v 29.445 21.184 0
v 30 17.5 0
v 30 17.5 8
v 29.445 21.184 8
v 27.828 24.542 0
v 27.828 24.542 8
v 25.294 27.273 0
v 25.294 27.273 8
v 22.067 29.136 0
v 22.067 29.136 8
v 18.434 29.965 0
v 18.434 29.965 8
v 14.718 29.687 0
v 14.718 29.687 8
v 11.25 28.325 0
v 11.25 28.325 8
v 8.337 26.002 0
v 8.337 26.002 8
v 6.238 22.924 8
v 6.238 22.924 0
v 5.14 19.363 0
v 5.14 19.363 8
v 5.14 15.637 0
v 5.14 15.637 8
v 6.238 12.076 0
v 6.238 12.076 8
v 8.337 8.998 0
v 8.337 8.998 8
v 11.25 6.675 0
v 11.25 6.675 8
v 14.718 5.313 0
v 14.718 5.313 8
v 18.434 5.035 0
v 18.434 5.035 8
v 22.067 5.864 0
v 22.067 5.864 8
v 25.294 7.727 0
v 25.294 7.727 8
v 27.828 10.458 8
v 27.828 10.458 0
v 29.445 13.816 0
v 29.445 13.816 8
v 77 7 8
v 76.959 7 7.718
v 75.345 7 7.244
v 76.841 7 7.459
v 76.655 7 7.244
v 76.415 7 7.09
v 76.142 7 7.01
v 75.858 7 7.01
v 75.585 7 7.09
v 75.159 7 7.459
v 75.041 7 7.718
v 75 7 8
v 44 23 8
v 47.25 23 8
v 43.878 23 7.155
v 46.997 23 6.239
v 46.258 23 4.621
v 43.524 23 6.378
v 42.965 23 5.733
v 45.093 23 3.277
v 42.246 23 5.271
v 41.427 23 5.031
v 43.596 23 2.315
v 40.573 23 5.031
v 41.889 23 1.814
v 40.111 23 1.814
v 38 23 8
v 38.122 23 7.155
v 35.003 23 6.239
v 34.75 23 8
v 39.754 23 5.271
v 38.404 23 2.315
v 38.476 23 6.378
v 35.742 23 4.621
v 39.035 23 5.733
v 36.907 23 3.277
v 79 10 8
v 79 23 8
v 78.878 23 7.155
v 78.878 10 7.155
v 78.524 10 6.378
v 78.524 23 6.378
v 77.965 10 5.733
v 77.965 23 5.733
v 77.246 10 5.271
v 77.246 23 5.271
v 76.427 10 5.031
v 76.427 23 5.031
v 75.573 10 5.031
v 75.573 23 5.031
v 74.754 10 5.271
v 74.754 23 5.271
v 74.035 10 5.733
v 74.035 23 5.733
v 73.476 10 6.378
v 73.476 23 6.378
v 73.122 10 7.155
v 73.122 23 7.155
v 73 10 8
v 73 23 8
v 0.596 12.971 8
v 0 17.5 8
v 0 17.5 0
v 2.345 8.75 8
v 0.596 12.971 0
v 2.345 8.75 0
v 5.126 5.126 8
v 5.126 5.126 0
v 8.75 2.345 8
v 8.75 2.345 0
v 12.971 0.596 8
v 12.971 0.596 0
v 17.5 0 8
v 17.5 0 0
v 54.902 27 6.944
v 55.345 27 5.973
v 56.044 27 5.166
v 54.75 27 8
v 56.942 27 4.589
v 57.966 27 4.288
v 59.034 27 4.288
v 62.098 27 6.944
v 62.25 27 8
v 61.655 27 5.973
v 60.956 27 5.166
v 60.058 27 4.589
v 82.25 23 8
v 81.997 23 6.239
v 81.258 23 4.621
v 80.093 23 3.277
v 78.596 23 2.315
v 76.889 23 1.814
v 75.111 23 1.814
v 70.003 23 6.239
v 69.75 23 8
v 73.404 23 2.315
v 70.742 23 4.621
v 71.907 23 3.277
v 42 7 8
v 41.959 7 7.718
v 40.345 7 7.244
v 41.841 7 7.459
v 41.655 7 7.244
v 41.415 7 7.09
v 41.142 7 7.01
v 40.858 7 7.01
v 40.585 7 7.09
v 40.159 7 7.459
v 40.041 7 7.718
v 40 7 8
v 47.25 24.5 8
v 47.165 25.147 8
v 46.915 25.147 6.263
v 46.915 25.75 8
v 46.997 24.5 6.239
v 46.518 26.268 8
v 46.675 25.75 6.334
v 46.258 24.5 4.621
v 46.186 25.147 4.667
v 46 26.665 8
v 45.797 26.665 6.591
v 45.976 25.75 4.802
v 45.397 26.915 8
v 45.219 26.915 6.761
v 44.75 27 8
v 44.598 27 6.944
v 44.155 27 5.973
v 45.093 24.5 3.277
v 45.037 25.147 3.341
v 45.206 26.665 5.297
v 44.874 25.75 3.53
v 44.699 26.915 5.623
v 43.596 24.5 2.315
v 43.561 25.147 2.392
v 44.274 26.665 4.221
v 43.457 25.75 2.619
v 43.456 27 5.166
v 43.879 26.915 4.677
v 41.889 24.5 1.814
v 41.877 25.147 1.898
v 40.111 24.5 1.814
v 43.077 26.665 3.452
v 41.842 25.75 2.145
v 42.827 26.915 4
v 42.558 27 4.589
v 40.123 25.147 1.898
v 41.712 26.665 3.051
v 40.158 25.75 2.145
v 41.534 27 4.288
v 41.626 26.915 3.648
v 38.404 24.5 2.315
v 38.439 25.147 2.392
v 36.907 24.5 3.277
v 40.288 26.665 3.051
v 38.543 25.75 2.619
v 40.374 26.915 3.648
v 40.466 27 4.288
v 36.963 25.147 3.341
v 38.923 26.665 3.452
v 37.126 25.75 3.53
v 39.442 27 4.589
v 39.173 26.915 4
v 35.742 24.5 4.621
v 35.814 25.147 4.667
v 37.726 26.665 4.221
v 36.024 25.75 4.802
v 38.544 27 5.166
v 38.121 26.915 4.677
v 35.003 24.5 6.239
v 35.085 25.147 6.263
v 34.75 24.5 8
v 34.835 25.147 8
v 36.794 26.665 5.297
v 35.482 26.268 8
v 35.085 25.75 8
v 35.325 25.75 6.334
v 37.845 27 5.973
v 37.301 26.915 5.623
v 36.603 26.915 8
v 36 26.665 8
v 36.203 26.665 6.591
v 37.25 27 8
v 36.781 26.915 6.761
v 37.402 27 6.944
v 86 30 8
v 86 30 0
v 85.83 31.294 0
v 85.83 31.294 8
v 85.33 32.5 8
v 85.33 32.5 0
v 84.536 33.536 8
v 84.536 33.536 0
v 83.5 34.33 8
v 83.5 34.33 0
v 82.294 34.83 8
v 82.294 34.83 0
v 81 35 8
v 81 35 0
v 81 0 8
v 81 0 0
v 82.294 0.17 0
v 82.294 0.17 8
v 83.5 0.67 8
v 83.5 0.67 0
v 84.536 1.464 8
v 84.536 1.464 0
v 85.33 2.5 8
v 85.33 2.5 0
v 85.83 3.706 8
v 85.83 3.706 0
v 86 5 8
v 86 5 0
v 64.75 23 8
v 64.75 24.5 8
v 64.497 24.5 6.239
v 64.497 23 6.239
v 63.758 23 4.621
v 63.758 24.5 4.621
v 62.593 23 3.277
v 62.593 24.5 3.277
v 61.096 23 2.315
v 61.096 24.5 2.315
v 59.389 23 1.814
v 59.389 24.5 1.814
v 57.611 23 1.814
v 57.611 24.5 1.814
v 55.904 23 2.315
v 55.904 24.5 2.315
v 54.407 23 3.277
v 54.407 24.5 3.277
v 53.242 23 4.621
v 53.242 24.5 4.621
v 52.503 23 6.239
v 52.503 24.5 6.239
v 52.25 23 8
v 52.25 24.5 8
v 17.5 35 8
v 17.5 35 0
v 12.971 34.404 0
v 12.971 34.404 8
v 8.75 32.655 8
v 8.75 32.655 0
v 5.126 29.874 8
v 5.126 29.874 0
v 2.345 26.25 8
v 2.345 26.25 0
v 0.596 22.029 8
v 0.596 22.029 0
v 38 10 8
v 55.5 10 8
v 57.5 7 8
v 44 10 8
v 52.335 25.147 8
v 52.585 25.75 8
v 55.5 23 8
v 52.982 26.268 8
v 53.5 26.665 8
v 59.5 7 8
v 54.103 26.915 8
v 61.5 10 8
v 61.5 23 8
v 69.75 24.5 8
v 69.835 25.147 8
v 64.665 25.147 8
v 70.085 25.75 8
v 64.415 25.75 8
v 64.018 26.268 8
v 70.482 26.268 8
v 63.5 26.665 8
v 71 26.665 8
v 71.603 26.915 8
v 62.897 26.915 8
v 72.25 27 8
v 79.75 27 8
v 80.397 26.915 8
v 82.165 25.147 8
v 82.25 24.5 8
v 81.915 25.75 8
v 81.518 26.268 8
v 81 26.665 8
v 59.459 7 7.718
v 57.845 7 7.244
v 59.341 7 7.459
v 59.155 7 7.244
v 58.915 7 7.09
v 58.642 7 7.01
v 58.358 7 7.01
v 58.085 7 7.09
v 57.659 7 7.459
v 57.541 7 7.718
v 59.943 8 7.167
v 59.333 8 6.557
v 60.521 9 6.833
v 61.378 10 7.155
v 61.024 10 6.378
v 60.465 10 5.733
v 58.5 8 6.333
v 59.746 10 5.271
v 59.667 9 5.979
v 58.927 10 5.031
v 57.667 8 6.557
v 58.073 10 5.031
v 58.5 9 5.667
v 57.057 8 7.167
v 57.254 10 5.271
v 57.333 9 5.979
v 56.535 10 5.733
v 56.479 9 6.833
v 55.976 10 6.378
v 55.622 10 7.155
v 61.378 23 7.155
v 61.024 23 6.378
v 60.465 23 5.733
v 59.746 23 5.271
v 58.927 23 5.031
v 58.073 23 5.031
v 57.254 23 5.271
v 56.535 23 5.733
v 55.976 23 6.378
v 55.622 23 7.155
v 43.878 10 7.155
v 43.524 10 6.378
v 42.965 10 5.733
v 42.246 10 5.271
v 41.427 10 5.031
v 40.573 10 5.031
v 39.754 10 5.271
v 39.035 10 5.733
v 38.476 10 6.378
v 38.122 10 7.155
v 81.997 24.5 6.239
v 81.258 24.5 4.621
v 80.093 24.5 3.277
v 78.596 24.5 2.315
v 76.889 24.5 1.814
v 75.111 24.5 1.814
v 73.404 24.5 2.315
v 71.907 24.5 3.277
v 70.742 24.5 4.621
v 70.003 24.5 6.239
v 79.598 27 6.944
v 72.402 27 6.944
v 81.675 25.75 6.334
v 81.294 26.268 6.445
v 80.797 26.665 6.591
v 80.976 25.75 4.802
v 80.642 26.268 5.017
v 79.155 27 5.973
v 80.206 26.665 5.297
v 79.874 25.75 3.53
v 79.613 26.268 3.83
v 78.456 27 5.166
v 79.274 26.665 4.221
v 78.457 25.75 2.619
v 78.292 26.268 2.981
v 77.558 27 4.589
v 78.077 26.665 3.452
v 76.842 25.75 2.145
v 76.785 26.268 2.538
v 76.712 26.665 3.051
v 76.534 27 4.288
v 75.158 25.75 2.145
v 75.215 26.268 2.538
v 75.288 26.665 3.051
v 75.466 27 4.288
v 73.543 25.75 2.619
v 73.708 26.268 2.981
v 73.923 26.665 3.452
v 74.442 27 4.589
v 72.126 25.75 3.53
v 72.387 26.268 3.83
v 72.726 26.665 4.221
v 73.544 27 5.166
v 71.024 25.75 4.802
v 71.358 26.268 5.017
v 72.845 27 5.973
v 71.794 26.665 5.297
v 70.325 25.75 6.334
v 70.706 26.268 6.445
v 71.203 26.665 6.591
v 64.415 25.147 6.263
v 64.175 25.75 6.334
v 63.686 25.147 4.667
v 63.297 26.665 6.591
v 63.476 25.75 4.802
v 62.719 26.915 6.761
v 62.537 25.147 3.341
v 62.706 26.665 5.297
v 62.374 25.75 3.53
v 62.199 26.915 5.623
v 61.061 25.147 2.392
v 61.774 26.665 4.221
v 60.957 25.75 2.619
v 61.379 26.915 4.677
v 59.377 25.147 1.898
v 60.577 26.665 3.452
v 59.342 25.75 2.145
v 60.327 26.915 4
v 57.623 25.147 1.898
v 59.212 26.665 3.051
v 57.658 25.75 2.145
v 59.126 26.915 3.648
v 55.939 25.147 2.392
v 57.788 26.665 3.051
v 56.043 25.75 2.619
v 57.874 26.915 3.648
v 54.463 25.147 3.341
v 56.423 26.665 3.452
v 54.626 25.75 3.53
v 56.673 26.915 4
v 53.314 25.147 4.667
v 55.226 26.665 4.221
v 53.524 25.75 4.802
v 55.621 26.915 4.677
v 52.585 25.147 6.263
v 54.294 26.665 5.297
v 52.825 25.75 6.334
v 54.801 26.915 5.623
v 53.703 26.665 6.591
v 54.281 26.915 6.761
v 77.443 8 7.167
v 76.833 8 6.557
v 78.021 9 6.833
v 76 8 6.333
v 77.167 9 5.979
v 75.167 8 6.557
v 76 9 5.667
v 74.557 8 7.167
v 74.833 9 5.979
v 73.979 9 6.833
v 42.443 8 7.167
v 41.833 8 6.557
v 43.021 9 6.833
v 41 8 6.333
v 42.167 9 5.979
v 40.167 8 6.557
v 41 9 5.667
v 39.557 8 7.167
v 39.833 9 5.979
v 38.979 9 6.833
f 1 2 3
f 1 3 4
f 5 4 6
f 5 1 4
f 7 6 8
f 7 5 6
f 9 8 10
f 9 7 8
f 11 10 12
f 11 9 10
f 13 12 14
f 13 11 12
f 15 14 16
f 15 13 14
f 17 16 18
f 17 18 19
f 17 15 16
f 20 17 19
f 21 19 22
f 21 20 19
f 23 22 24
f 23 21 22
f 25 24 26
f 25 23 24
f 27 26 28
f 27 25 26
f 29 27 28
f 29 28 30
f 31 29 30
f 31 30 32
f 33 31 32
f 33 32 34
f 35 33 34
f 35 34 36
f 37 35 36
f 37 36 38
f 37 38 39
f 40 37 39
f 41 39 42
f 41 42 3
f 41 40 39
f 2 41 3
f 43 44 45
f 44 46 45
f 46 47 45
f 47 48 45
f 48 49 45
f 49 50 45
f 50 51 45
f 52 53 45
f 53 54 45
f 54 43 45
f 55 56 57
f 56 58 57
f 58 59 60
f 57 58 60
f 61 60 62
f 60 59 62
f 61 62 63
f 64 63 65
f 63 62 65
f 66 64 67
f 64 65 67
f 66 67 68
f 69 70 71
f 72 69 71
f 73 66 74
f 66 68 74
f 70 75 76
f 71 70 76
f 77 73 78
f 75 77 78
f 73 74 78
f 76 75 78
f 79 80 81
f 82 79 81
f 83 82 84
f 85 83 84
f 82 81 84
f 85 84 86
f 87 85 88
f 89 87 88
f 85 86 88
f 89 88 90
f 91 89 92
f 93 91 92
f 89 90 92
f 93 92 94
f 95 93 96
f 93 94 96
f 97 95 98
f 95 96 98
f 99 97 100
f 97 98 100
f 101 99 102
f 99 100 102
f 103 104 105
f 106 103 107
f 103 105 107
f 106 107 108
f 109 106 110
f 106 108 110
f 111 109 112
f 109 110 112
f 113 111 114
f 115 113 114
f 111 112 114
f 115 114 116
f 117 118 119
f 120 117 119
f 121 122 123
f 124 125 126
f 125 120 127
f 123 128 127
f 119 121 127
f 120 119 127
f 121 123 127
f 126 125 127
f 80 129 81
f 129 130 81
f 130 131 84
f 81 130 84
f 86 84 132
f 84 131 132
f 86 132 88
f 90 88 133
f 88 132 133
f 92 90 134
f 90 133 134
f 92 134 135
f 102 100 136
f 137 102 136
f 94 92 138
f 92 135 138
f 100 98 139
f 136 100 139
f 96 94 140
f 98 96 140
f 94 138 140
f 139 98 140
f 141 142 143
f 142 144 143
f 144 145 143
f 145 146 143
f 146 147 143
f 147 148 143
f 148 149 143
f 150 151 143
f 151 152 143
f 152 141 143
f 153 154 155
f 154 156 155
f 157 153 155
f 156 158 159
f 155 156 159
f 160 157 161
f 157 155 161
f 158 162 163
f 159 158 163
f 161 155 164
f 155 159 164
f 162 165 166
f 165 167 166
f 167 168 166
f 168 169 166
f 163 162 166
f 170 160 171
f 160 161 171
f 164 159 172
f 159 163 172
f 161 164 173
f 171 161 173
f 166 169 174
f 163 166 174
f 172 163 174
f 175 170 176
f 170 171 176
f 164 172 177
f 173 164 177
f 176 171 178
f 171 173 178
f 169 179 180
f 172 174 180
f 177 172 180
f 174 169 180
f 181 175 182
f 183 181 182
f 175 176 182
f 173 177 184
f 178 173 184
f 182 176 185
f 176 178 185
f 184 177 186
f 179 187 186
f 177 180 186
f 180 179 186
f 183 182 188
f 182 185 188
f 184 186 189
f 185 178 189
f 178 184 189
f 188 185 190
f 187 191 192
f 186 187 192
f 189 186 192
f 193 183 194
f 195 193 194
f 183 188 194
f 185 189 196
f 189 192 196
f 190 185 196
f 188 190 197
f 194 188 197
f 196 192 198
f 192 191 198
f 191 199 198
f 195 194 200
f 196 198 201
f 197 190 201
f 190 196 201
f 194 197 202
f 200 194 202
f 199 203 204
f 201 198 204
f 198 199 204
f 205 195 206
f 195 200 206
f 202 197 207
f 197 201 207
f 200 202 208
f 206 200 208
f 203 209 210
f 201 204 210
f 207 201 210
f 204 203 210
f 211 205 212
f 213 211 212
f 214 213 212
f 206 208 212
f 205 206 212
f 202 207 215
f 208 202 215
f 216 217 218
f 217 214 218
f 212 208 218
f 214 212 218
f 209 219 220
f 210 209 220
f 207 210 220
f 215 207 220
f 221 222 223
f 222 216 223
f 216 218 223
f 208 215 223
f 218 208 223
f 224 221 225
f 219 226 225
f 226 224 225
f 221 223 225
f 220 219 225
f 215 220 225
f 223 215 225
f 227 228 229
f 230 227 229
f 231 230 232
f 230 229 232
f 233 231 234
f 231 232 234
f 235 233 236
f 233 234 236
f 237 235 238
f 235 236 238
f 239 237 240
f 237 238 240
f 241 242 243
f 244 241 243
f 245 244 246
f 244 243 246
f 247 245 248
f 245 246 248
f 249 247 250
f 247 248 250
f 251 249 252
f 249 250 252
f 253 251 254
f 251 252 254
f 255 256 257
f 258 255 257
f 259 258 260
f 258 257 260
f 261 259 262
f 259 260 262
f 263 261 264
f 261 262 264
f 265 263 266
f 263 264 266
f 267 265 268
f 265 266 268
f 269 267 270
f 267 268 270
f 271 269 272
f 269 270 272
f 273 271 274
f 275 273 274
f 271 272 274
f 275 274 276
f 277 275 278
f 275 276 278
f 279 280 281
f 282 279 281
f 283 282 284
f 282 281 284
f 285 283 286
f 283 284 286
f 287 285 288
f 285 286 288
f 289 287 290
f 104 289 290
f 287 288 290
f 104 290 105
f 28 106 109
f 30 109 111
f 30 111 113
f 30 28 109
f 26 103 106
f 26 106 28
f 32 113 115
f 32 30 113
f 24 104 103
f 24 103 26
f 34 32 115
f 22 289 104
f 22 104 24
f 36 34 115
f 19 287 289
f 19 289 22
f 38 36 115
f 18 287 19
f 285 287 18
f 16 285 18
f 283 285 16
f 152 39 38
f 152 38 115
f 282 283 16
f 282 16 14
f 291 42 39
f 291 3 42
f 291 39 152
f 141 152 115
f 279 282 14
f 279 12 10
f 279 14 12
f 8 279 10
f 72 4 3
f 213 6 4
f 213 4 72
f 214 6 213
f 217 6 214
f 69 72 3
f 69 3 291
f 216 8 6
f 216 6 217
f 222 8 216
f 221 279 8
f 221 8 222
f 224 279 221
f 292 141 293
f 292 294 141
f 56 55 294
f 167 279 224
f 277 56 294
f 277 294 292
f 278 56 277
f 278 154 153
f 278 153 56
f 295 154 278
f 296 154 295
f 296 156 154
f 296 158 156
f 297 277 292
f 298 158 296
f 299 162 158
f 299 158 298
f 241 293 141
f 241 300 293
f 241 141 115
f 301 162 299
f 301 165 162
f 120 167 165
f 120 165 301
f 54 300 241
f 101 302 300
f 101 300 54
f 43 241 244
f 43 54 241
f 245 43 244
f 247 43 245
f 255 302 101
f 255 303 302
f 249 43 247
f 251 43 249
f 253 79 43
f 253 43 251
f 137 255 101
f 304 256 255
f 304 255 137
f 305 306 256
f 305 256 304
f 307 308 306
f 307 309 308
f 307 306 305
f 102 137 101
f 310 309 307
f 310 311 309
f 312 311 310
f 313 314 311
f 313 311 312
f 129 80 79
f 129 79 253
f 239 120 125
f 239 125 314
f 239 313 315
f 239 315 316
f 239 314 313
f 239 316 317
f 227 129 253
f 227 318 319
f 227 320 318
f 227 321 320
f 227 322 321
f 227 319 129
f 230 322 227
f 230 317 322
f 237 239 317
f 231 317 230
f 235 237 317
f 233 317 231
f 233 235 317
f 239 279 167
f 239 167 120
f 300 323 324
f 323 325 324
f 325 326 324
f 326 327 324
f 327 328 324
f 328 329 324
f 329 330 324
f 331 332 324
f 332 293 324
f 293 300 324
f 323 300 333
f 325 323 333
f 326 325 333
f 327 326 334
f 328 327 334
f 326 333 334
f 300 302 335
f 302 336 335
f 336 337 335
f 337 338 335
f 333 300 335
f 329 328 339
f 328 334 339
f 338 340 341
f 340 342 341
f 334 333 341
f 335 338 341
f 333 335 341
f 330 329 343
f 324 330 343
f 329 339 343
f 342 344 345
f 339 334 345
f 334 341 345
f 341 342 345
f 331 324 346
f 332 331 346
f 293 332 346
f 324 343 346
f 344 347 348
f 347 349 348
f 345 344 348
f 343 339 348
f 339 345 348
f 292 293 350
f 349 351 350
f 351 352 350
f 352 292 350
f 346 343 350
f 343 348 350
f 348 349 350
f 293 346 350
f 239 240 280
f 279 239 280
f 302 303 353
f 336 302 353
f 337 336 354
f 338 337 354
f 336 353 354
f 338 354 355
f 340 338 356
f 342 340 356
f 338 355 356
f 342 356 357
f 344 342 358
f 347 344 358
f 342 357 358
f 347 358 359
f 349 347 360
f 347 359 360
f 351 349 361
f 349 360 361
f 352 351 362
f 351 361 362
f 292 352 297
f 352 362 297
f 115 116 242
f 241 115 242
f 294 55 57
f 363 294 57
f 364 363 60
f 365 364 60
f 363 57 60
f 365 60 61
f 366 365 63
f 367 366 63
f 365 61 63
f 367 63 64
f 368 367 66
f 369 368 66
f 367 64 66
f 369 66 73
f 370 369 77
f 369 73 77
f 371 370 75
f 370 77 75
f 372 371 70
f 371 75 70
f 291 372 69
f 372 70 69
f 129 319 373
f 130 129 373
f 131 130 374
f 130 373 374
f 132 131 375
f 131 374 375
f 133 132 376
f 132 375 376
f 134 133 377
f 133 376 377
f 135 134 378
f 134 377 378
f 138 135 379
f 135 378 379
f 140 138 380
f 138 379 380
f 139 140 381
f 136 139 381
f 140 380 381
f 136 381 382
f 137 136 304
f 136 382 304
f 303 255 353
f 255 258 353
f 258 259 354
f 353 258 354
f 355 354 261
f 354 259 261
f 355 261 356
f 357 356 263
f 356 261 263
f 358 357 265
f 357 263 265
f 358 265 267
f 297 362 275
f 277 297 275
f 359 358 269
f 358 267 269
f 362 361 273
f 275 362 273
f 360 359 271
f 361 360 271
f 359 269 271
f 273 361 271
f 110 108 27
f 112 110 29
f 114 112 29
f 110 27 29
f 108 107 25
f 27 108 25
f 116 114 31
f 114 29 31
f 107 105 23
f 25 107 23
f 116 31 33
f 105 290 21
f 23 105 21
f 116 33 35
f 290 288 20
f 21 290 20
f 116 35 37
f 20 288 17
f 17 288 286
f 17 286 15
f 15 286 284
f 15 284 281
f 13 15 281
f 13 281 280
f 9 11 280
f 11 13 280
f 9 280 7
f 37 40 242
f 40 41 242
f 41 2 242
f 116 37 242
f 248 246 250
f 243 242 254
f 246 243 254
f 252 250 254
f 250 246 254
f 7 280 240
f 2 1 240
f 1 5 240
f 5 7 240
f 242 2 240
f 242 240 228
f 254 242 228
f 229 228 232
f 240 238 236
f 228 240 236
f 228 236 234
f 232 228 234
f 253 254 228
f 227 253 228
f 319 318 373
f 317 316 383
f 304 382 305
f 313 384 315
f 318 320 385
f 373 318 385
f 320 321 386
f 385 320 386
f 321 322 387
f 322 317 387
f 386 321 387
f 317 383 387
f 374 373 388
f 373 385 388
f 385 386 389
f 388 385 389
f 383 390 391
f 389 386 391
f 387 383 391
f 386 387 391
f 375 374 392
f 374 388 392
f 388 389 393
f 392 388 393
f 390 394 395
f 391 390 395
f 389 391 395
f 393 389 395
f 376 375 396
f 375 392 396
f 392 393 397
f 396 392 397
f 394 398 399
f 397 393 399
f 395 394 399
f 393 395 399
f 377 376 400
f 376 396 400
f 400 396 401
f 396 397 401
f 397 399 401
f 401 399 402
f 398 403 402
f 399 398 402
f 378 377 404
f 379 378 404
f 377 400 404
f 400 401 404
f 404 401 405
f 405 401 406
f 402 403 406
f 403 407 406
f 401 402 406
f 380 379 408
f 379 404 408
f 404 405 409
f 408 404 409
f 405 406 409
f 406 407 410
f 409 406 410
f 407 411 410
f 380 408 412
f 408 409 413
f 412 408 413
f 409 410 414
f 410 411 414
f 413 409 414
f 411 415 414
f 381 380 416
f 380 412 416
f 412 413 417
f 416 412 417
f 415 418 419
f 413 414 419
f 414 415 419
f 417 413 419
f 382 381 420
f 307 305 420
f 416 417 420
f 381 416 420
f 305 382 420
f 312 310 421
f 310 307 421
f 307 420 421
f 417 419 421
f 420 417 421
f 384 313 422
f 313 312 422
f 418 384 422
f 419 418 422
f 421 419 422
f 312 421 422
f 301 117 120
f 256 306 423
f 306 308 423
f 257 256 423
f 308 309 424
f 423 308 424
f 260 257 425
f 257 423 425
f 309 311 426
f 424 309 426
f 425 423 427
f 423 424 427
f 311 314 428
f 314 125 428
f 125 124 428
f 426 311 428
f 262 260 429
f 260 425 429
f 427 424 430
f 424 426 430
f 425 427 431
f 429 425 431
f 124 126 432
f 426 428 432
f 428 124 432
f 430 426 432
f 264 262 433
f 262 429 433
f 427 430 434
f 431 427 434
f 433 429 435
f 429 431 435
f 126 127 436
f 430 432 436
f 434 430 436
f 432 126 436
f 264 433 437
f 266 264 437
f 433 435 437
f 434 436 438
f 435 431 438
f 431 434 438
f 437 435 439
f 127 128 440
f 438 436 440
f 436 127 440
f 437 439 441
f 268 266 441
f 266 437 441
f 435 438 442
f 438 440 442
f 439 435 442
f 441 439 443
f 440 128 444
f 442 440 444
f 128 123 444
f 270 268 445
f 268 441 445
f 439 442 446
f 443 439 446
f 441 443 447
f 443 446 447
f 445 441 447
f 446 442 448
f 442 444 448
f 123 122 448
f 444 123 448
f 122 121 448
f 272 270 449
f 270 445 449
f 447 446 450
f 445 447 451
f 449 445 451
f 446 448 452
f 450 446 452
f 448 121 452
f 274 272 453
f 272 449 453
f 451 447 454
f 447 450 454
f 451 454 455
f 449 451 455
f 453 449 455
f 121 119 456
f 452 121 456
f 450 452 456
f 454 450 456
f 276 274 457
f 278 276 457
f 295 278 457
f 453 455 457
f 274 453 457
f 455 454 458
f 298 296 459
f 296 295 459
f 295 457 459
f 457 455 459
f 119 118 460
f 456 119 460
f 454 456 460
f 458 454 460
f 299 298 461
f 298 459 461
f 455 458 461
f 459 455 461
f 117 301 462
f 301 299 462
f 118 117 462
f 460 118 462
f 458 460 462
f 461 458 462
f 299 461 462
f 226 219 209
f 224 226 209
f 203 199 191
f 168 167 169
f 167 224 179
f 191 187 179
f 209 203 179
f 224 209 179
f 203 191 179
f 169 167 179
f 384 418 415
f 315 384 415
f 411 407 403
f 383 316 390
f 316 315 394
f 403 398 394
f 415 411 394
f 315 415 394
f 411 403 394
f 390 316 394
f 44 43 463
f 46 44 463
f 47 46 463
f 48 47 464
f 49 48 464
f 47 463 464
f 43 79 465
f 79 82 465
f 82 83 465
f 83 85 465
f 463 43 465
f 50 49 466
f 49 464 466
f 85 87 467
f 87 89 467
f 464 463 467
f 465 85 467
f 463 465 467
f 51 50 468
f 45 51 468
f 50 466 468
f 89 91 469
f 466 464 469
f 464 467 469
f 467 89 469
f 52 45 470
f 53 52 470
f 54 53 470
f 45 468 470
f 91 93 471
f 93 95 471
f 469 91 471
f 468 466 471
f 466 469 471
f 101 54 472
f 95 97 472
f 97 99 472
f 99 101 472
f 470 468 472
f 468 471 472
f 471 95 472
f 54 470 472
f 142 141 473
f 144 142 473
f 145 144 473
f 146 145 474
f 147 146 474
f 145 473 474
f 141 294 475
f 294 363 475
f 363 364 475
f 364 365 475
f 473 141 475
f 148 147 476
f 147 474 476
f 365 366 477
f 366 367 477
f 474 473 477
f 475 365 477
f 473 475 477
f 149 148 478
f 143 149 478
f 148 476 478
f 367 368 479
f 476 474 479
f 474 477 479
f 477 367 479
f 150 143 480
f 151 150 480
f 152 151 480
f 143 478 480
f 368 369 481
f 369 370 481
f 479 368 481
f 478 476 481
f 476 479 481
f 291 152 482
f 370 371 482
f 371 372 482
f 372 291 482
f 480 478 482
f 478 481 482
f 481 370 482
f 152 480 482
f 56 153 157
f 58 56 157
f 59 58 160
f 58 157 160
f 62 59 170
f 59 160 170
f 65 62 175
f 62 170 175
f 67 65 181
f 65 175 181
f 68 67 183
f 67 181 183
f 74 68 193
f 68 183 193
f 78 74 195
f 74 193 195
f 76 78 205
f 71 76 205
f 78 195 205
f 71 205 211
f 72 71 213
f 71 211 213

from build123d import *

# Parameters (mm, degrees)
F0_R     = 12.5
F1_DEPTH = 8


with BuildPart() as f1:
    # F0 (on Top) → F1 (new body)
    with BuildSketch(Plane.XY):
        with BuildLine():
            ThreePointArc((0, 17.5), (5.125631, 5.125631), (17.5, 0))
            Line((17.5, 0), (81, 0))
            ThreePointArc((81, 0), (84.535534, 1.464466), (86, 5))
            Line((86, 5), (86, 30))
            ThreePointArc((86, 30), (84.535534, 33.535534), (81, 35))
            Line((81, 35), (17.5, 35))
            ThreePointArc((17.5, 35), (5.125631, 29.874369), (0, 17.5))
        make_face()
        with Locations((17.5, 17.5)):
            Circle(F0_R, mode=Mode.SUBTRACT)
    extrude(amount=F1_DEPTH)

    # F2 (on face) → F3 (revolve, cut)
    with BuildSketch(Plane.XY.offset(8)):
        with BuildLine():
            Line((41, 23), (41, 7))
            Line((41, 7), (42, 7))
            Line((42, 7), (44, 10))
            Line((44, 10), (44, 23))
            Line((44, 23), (47.25, 23))
            Line((47.25, 23), (47.25, 24.5))
            ThreePointArc((47.25, 24.5), (46.517767, 26.267767), (44.75, 27))
            Line((44.75, 27), (41, 27))
            Line((41, 27), (41, 23))
        make_face()
    revolve(axis=Axis((41, 15, 8), (0, 1, 0)), mode=Mode.SUBTRACT)

    # F2 (on face) → F4 (revolve, cut)
    with BuildSketch(Plane.XY.offset(8)):
        with BuildLine():
            Line((58.5, 23), (58.5, 7))
            Line((58.5, 7), (59.5, 7))
            Line((59.5, 7), (61.5, 10))
            Line((61.5, 10), (61.5, 23))
            Line((61.5, 23), (64.75, 23))
            Line((64.75, 23), (64.75, 24.5))
            ThreePointArc((64.75, 24.5), (64.017767, 26.267767), (62.25, 27))
            Line((62.25, 27), (58.5, 27))
            Line((58.5, 27), (58.5, 23))
        make_face()
    revolve(axis=Axis((58.5, 15, 8), (0, 1, 0)), mode=Mode.SUBTRACT)

    # F2 (on face) → F5 (revolve, cut)
    with BuildSketch(Plane.XY.offset(8)):
        with BuildLine():
            Line((76, 23), (76, 7))
            Line((76, 7), (77, 7))
            Line((77, 7), (79, 10))
            Line((79, 10), (79, 23))
            Line((79, 23), (82.25, 23))
            Line((82.25, 23), (82.25, 24.5))
            ThreePointArc((82.25, 24.5), (81.517767, 26.267767), (79.75, 27))
            Line((79.75, 27), (76, 27))
            Line((76, 27), (76, 23))
        make_face()
    revolve(axis=Axis((76, 15, 8), (0, 1, 0)), mode=Mode.SUBTRACT)


solid = f1.part
